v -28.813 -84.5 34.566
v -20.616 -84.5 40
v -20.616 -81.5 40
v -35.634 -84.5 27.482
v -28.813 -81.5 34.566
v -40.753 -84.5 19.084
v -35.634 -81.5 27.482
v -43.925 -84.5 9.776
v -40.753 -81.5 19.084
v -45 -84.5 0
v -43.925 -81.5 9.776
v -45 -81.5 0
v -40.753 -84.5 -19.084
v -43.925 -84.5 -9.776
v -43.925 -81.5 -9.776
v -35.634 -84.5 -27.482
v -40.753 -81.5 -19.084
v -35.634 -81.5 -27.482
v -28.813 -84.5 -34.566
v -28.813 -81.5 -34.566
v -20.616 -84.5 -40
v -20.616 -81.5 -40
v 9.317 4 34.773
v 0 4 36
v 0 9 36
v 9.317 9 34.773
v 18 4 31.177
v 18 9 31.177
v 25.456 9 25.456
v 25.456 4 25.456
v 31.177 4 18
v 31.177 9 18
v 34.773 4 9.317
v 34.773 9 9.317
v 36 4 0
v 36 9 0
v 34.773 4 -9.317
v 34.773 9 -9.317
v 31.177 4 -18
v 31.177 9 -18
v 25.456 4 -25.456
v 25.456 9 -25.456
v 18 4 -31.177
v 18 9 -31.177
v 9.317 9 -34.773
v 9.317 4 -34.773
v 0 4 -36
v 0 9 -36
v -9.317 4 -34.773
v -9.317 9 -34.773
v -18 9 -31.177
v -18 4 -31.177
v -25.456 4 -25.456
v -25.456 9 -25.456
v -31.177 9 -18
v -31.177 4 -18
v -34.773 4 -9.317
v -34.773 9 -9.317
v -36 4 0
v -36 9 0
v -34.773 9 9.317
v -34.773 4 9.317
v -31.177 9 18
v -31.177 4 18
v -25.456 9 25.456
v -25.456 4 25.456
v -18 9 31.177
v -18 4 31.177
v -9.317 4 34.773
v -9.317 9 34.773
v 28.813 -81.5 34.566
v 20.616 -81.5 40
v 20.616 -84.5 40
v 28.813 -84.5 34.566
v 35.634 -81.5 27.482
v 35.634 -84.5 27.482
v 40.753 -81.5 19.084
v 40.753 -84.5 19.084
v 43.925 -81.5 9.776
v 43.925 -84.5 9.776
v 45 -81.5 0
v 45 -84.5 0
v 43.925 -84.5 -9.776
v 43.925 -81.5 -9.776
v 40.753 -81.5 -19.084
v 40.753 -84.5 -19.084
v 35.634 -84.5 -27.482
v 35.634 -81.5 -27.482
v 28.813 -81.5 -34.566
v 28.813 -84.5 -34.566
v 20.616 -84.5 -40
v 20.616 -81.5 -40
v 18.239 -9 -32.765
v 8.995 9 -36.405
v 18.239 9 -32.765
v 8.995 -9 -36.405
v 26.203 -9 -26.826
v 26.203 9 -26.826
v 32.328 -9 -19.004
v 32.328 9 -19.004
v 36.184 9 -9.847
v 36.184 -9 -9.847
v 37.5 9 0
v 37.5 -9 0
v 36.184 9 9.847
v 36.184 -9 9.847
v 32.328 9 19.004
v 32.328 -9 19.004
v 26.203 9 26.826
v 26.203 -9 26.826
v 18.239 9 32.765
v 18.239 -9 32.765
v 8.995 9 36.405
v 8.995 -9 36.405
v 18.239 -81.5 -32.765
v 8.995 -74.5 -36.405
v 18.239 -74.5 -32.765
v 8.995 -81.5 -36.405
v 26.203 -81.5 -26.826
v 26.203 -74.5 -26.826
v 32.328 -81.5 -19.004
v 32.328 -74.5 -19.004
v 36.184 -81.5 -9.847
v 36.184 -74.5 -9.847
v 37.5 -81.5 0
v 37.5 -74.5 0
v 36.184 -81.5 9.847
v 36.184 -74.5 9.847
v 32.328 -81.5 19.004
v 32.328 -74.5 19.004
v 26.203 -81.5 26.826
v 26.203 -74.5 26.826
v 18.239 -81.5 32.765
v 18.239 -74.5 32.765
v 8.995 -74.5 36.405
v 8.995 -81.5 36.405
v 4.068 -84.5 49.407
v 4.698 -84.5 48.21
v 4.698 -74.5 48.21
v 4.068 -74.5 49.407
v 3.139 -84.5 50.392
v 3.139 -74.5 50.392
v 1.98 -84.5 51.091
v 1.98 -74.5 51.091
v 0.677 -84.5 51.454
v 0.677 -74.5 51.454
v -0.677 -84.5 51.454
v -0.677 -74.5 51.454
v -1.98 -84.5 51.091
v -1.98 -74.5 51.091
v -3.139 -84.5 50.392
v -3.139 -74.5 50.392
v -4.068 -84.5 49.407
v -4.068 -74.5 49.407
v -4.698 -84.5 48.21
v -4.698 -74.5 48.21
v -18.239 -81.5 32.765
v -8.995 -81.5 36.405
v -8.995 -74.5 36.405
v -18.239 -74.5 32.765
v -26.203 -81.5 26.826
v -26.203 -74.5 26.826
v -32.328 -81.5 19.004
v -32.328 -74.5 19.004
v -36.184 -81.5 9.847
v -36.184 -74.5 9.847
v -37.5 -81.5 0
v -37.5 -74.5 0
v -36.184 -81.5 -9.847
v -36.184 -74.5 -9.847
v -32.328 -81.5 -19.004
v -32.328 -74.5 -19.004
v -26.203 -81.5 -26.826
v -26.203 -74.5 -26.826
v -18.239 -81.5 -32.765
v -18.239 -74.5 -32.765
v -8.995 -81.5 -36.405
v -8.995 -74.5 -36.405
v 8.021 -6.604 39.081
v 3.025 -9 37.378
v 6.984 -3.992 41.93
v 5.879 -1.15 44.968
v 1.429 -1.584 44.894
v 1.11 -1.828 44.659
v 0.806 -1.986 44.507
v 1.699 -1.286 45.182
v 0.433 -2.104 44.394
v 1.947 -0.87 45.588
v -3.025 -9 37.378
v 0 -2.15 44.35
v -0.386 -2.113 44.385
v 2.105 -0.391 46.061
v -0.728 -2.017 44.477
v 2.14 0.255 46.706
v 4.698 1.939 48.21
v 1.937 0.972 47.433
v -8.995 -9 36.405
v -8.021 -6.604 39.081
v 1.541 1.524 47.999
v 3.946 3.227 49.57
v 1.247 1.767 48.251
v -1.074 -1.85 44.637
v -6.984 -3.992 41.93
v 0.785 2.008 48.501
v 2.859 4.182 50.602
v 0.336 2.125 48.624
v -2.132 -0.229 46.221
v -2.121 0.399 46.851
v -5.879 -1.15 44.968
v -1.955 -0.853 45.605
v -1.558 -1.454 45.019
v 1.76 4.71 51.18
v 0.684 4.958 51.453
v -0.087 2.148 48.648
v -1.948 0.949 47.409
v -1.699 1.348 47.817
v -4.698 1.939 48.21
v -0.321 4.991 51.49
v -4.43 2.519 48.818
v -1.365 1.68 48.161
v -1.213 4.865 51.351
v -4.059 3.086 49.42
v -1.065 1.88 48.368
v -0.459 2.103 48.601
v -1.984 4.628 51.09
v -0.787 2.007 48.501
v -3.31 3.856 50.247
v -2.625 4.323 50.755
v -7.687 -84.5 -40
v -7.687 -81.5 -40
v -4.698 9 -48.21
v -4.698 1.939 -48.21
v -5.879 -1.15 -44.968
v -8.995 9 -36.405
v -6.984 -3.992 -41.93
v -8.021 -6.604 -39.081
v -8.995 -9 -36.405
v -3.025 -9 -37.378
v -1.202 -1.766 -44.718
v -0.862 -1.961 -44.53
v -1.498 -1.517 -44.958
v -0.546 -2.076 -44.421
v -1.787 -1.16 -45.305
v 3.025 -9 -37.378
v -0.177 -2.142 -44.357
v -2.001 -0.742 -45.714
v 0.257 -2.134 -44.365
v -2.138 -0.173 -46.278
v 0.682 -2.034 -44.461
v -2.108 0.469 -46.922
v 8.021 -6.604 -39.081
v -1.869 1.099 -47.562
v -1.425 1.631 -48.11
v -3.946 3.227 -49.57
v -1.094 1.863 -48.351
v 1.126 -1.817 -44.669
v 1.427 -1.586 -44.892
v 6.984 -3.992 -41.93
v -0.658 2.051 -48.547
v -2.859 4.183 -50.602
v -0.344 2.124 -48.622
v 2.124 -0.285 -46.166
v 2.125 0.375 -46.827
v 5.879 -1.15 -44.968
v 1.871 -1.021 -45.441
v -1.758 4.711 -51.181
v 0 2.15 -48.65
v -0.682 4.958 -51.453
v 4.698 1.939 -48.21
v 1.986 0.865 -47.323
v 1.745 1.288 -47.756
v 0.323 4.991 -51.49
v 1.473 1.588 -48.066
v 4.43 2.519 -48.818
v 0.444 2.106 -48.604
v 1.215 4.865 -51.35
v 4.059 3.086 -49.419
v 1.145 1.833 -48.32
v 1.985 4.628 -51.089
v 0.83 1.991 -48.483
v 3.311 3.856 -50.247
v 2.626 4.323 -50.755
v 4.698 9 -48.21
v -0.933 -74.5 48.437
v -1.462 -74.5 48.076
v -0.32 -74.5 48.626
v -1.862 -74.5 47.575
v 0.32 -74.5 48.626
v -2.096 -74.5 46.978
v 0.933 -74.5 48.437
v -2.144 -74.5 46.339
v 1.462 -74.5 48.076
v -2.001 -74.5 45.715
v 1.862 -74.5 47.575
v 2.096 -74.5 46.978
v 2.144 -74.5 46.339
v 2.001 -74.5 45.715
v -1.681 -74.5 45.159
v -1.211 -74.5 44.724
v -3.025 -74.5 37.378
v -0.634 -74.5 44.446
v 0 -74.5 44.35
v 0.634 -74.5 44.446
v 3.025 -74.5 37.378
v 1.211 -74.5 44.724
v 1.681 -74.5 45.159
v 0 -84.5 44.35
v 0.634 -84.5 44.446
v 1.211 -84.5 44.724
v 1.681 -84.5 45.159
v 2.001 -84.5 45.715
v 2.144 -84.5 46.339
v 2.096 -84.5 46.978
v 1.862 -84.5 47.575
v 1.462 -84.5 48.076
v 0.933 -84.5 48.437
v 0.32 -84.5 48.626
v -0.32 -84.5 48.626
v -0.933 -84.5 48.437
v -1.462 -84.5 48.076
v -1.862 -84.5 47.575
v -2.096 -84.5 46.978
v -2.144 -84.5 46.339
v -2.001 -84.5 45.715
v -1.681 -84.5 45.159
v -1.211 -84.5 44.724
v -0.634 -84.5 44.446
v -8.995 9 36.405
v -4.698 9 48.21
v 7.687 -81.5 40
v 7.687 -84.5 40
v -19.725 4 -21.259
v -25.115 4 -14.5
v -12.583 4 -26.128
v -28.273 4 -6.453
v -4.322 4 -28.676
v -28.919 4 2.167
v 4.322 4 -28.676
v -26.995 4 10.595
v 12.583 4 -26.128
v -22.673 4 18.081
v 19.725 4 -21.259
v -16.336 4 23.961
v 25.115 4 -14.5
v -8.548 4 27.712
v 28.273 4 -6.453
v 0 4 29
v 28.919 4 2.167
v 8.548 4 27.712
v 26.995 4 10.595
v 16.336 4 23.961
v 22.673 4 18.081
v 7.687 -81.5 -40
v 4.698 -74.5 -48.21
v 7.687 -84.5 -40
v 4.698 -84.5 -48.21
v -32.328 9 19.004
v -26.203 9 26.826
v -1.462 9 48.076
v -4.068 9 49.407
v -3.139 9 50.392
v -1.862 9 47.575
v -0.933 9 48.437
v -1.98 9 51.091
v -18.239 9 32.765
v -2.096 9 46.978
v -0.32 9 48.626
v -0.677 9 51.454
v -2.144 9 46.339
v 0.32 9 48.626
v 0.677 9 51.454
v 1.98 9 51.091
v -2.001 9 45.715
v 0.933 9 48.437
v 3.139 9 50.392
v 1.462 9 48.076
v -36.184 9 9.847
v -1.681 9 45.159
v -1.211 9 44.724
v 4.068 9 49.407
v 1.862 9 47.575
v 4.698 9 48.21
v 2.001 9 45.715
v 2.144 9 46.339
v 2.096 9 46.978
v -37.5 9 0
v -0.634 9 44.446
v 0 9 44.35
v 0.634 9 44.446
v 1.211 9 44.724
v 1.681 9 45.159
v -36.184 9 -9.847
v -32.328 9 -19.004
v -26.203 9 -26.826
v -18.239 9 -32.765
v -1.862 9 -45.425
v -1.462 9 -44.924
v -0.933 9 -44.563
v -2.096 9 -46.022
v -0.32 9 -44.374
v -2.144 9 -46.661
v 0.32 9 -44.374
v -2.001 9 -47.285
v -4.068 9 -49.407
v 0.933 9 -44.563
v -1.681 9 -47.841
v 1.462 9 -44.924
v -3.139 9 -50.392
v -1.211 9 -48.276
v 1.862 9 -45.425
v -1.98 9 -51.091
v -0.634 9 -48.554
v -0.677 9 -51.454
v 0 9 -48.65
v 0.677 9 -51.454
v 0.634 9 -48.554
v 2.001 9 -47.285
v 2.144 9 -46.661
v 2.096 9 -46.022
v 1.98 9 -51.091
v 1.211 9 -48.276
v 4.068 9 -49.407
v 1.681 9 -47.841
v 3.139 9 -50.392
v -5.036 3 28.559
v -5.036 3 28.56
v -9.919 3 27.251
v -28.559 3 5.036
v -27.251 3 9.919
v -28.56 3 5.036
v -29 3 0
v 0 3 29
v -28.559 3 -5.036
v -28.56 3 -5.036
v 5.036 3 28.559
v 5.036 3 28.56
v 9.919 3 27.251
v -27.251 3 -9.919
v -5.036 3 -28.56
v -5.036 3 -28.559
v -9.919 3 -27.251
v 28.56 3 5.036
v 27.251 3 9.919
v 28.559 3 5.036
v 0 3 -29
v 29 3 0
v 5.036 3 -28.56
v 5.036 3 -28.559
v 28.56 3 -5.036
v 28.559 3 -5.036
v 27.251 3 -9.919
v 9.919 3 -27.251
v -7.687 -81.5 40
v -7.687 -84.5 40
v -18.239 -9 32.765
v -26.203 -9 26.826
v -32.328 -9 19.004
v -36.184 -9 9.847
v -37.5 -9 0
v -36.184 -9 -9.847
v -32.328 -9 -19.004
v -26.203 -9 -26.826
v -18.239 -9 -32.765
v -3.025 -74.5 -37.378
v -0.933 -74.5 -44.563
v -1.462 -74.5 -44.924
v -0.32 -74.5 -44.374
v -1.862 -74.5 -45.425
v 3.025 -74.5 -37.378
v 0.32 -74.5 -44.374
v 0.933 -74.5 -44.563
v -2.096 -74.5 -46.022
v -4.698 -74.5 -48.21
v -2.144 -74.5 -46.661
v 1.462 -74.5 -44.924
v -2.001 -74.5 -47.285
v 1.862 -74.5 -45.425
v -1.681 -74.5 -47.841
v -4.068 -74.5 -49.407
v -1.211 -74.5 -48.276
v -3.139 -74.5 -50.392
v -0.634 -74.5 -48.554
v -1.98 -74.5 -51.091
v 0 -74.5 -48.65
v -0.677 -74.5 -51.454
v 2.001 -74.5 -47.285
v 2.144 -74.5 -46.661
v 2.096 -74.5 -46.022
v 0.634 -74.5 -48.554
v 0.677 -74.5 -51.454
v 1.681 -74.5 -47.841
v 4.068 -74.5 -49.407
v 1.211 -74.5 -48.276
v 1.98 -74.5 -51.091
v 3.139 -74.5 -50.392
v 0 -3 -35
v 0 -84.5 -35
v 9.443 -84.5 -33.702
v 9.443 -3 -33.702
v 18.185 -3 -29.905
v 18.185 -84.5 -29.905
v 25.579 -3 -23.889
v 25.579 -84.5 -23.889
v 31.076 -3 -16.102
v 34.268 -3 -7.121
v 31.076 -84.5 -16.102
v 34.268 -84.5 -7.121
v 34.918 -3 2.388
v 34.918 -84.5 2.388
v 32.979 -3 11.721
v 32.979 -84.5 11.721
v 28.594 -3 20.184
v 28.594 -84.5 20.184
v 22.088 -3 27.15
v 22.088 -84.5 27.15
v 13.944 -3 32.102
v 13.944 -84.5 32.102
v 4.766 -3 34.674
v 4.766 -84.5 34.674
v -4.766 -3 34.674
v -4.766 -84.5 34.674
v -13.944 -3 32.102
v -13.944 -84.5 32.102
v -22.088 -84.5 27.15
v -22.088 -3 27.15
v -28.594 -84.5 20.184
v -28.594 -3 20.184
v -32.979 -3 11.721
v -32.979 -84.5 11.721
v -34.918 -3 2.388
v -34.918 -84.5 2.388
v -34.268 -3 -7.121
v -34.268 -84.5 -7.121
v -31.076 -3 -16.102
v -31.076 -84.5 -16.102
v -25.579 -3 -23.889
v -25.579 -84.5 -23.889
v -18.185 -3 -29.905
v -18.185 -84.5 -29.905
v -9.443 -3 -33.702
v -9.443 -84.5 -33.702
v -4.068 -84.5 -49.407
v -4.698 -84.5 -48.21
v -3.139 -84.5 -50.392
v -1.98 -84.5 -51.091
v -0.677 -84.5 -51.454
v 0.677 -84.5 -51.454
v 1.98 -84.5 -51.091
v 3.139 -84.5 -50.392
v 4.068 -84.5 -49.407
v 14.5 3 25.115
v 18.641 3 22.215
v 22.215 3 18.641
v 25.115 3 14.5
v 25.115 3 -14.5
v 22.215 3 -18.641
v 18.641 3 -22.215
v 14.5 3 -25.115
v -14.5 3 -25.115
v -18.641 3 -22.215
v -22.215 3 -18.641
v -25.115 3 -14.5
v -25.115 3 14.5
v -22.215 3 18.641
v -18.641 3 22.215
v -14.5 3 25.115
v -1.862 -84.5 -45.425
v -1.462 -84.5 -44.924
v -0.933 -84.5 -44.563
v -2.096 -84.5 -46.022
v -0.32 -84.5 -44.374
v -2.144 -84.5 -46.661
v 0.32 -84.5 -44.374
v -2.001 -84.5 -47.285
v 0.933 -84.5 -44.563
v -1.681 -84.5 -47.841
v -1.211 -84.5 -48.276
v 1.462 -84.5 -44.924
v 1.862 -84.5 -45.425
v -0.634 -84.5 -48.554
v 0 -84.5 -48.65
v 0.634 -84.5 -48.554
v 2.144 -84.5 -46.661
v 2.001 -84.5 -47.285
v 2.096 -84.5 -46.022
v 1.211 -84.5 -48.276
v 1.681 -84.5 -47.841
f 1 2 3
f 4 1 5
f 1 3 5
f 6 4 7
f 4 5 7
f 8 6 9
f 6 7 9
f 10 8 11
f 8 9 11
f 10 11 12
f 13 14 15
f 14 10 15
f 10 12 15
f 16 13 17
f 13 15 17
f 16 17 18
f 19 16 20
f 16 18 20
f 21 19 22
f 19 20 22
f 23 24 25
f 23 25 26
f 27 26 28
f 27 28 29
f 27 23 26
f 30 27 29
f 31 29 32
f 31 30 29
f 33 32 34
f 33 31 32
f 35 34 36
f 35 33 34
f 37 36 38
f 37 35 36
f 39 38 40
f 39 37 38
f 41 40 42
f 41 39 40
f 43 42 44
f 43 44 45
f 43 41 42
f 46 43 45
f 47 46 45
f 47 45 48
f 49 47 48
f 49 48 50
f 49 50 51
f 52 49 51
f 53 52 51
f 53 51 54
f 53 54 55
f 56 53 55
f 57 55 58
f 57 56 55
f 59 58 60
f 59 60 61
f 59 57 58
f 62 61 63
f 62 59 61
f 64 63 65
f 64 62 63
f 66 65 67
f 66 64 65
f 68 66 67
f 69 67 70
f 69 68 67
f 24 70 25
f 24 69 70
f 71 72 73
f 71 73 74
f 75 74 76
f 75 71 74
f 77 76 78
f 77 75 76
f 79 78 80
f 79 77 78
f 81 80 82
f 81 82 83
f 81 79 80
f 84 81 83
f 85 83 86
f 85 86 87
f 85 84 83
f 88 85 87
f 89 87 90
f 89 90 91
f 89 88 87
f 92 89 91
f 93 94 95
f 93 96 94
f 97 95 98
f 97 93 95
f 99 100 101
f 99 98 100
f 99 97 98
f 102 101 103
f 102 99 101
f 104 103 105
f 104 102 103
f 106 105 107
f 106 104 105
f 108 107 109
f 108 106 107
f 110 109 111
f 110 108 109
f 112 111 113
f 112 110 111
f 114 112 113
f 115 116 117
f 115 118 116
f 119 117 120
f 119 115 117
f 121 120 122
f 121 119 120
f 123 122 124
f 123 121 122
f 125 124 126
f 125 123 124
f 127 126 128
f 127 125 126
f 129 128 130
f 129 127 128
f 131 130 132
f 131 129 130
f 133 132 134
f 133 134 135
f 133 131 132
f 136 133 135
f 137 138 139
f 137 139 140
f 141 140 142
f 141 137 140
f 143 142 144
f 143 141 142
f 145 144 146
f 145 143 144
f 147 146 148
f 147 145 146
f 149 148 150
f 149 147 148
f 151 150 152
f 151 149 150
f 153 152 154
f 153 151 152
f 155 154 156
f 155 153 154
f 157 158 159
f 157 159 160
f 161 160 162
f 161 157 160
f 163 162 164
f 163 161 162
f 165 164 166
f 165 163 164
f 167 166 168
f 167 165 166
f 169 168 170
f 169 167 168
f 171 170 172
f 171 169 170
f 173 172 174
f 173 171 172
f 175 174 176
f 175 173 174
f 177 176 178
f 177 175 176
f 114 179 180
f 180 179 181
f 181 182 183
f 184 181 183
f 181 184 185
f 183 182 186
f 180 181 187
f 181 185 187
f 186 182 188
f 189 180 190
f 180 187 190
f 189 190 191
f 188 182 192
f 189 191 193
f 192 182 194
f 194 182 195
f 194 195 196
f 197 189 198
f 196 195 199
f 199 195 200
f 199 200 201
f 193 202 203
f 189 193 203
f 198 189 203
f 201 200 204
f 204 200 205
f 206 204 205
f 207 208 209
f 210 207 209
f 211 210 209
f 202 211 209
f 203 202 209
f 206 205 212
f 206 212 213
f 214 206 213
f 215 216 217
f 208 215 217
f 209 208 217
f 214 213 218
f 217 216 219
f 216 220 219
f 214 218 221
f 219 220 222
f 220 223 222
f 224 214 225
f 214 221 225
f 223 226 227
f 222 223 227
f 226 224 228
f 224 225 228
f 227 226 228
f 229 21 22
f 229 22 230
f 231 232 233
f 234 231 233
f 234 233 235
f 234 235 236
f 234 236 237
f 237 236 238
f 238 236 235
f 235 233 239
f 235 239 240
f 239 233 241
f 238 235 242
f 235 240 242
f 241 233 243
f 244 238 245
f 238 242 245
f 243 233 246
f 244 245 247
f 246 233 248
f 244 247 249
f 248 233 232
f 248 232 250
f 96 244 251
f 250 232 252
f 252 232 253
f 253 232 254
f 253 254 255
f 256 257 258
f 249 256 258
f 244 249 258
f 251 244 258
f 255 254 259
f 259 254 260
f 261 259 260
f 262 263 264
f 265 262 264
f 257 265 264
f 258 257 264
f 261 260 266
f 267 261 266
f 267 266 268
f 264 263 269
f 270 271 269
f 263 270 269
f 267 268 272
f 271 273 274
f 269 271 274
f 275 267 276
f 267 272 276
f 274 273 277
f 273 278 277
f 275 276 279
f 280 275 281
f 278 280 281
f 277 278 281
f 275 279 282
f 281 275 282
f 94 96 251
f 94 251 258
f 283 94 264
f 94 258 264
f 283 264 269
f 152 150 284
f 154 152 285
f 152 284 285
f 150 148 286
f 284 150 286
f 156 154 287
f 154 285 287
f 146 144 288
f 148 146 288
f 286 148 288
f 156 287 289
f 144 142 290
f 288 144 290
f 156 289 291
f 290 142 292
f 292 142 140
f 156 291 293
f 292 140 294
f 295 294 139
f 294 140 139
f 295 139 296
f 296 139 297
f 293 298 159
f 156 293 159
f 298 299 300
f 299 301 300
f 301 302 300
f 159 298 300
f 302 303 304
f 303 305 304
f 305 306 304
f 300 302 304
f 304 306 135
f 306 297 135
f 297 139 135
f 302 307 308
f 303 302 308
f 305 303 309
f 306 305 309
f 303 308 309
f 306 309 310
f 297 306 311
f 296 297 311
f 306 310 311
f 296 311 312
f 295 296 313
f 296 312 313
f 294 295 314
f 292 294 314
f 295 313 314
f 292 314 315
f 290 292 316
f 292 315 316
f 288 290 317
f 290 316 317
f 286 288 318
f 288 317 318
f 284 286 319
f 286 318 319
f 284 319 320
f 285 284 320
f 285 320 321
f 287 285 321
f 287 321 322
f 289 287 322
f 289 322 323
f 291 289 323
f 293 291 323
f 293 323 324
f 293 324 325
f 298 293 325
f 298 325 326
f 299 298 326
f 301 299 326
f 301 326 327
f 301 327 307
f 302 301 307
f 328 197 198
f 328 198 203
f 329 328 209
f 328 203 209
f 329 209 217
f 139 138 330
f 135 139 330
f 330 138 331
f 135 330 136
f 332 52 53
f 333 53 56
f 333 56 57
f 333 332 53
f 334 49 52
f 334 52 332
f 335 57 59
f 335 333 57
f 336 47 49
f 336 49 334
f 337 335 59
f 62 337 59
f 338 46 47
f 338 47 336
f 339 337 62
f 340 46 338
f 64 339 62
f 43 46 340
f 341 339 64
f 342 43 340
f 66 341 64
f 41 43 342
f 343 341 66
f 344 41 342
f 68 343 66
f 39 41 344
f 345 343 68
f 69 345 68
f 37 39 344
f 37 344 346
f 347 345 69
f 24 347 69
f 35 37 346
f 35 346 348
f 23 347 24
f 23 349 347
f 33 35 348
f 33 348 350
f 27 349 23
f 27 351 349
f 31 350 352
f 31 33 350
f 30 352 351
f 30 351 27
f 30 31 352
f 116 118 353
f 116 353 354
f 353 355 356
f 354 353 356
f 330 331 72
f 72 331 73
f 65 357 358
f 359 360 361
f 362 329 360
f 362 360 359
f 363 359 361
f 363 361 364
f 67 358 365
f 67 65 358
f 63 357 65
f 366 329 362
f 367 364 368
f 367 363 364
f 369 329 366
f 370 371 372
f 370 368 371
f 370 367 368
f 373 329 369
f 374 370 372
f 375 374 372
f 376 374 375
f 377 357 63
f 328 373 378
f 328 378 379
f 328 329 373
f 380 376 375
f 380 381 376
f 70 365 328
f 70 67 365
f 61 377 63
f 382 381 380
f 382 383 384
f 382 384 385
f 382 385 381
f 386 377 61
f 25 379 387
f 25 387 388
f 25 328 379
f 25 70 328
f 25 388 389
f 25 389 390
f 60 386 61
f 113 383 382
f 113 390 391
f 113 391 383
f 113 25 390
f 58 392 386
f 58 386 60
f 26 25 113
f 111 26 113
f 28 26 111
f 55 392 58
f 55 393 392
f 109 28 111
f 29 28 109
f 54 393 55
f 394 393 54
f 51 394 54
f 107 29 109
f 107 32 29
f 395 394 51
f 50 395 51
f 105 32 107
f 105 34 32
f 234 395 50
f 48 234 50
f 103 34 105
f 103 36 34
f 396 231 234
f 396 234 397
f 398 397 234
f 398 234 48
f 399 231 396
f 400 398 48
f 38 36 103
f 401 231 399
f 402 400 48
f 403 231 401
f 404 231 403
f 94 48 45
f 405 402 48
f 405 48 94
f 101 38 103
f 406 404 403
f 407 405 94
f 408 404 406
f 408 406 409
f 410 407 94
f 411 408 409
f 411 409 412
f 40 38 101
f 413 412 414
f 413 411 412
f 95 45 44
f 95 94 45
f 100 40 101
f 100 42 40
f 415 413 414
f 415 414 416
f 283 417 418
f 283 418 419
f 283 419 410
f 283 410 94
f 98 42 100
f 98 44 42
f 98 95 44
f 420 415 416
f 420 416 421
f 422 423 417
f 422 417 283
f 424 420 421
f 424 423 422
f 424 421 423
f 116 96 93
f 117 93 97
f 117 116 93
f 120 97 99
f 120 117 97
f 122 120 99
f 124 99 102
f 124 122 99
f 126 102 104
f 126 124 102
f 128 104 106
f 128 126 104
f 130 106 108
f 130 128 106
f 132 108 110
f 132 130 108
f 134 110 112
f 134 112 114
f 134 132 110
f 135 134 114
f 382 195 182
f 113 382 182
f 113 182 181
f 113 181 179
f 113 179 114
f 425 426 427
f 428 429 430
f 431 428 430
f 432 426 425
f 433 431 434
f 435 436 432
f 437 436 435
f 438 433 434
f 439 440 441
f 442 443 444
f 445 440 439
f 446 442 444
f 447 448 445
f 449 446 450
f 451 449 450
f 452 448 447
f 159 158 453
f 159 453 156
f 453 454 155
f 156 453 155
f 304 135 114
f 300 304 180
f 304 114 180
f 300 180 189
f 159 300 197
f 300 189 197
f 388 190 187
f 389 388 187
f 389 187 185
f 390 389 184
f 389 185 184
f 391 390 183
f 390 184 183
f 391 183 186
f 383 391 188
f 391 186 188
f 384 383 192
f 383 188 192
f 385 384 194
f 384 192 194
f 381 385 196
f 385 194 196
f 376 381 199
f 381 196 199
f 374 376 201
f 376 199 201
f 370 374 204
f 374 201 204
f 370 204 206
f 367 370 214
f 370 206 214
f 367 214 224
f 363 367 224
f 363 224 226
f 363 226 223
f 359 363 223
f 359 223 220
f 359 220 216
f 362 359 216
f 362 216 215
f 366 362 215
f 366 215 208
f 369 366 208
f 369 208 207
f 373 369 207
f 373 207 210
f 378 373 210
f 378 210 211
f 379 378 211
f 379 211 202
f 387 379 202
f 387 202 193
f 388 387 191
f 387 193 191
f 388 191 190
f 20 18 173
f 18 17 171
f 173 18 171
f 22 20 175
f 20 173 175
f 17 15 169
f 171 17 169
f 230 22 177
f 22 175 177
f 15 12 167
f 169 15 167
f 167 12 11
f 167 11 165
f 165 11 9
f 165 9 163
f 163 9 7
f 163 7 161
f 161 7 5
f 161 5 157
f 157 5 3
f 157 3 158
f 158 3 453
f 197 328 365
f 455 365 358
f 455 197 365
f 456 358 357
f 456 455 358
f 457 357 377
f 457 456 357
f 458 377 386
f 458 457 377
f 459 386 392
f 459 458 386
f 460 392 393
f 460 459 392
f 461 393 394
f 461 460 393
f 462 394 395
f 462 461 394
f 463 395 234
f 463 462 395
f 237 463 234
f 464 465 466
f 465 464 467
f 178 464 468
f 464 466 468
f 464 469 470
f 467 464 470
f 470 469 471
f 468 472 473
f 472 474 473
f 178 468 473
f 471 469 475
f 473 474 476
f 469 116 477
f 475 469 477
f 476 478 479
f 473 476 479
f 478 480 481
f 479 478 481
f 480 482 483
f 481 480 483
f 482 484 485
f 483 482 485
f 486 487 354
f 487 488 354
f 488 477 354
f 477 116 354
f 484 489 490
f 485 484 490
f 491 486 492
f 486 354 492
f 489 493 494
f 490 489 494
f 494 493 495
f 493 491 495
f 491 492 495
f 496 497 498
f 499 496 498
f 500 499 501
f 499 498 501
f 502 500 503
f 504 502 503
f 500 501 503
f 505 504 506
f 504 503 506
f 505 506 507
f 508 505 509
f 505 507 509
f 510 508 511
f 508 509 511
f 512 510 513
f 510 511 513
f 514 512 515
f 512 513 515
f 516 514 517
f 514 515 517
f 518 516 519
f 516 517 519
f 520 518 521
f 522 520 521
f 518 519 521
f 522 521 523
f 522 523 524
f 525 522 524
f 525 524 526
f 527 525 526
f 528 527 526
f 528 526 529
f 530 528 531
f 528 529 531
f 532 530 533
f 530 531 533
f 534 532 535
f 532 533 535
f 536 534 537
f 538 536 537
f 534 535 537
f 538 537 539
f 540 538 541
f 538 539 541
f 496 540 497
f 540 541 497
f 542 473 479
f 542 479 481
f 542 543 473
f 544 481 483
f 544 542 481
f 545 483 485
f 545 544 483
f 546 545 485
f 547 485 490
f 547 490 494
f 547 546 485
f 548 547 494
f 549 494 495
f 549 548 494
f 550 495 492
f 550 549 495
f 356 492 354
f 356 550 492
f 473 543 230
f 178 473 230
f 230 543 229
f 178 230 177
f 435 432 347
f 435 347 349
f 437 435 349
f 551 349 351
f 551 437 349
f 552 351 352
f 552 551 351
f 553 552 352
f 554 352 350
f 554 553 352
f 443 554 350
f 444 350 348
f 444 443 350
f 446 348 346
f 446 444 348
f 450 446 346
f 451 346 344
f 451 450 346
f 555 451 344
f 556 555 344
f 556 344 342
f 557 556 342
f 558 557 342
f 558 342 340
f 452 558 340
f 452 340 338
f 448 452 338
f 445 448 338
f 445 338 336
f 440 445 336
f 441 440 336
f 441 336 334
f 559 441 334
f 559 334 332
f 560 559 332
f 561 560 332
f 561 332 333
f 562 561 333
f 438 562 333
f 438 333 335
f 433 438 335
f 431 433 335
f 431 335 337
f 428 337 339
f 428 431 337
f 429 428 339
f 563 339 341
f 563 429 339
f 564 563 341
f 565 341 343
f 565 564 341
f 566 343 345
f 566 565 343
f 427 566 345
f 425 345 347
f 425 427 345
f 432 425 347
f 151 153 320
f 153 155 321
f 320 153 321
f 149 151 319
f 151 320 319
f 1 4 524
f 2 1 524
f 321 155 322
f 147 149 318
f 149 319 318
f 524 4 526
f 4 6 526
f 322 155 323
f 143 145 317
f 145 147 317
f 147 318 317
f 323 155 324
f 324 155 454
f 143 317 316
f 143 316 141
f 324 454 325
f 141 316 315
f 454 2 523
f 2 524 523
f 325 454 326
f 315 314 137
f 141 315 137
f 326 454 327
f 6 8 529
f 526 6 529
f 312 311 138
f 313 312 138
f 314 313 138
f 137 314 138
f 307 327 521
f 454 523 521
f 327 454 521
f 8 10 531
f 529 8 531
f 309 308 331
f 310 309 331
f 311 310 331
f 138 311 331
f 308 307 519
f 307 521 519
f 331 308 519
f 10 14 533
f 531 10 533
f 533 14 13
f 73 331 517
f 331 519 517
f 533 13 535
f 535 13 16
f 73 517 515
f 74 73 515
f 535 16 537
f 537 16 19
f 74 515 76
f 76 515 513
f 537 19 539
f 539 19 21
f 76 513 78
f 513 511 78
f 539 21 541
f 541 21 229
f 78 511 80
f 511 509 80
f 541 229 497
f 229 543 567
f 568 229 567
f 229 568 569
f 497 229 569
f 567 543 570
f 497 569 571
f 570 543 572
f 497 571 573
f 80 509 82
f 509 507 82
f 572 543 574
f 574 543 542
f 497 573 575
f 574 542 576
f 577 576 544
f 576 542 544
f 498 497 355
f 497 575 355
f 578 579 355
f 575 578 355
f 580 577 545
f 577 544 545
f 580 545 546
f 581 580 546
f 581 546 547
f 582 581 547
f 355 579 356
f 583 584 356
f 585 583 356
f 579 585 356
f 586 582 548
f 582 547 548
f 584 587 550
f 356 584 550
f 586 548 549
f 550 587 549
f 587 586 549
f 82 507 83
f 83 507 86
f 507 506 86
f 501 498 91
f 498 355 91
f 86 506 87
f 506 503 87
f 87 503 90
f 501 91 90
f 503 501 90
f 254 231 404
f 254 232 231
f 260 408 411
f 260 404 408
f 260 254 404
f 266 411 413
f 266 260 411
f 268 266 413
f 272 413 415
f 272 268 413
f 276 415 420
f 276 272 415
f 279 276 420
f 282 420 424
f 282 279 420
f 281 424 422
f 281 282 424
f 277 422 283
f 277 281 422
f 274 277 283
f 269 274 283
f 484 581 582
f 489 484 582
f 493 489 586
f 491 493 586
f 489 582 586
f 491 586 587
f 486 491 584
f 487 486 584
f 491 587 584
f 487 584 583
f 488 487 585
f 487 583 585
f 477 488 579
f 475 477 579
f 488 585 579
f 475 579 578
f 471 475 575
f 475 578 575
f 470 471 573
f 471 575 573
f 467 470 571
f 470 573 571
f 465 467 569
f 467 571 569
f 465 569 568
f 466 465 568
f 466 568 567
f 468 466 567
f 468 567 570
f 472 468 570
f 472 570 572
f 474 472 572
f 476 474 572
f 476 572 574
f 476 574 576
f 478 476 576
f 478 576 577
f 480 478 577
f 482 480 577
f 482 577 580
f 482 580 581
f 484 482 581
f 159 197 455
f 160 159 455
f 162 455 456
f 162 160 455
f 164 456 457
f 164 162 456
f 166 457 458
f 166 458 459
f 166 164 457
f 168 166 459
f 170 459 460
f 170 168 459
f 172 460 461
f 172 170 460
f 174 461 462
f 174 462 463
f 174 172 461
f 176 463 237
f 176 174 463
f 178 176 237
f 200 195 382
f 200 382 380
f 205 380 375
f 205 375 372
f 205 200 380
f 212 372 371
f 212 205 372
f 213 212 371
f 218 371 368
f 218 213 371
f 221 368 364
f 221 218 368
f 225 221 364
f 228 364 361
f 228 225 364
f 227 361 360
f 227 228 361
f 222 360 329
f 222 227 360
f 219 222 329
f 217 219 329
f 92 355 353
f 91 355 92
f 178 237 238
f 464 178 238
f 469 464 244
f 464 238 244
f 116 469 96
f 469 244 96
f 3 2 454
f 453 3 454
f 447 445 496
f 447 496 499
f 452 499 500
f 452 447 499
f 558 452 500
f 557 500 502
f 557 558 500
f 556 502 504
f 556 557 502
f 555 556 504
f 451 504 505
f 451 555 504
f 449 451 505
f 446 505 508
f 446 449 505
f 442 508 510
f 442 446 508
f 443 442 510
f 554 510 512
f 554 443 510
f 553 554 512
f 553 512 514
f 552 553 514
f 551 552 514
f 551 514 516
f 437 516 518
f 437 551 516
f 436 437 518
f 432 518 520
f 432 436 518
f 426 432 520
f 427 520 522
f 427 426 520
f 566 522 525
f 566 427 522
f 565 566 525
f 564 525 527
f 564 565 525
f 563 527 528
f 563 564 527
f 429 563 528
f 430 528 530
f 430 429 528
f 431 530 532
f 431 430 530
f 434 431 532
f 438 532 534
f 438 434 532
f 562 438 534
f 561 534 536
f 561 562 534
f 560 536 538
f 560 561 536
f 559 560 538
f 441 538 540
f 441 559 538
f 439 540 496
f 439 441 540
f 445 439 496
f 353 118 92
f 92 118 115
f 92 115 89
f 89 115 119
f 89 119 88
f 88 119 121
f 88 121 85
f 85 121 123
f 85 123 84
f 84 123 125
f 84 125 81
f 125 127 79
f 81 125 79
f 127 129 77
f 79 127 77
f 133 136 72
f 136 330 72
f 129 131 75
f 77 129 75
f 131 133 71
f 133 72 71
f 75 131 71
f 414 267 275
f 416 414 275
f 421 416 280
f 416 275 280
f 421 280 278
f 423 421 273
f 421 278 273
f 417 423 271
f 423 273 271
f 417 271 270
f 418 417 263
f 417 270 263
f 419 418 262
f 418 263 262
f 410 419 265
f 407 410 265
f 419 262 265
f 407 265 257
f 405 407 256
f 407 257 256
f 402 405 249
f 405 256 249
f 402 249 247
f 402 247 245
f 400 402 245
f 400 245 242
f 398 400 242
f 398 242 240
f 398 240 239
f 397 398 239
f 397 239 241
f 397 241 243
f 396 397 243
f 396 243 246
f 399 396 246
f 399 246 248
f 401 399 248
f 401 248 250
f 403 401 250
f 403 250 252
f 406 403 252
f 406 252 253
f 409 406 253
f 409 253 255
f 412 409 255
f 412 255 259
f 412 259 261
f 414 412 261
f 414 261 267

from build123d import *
from build123d.topology import SkipClean

# Parameters (mm, degrees)
SKETCH_1_R          = 37.5
SKETCH_1_R_2        = 29
EXTRUDE_1_DEPTH     = 4
SKETCH_2_R          = 37.5
SKETCH_2_R_2        = 36
EXTRUDE_2_DEPTH     = 5
EXTRUDE_START       = 84.5
SKETCH_3_R          = 37.5
SKETCH_3_R_2        = 29
EXTRUDE_3_DEPTH     = 84.5
SKETCH_4_W          = 100
SKETCH_4_H          = 80
SKETCH_4_R          = 37.5
EXTRUDE_4_DEPTH     = 3
SKETCH_5_R          = 5
SKETCH_5_R_2        = 2.15
EXTRUDE_5_DEPTH     = 93.5
EXTRUDE_5_2_DEPTH   = 93.5
EXTRUDE_START_2     = -3
EXTRUDE_6_DEPTH     = 93.5
SKETCH_8_R          = 35
CUT_EXTRUDE_1_DEPTH = 87.5
CHAMFER_1_SIZE      = 6
CUT_EXTRUDE_2_DEPTH = 116.509739972


with BuildPart() as part:
    # 草图1 → 凸台-拉伸1 (new body)
    with BuildSketch(Plane(origin=(0, 0, 0), x_dir=(1, 0, 0), z_dir=(0, 1, 0))):
        with Locations(Location((0, 0, 0), (0, 0, 270))):
            Circle(SKETCH_1_R)
        with Locations(Location((0, 0, 0), (0, 0, 270))):
            Circle(SKETCH_1_R_2, mode=Mode.SUBTRACT)
    extrude(amount=EXTRUDE_1_DEPTH)

    # 草图2 → 凸台-拉伸2 (add)
    with BuildSketch(Plane(origin=(0, 4, 0), x_dir=(1, 0, 0), z_dir=(0, 1, 0))):
        with Locations(Location((0, 0, 0), (0, 0, 270))):
            Circle(SKETCH_2_R)
        with Locations(Location((0, 0, 0), (0, 0, 270))):
            Circle(SKETCH_2_R_2, mode=Mode.SUBTRACT)
    extrude(amount=EXTRUDE_2_DEPTH)

    # 草图3 → 凸台-拉伸3 (add)
    with BuildSketch(Plane.XZ.offset(EXTRUDE_START)):
        with Locations(Location((0, 0, 0), (0, 0, 270))):
            Circle(SKETCH_3_R)
        with Locations(Location((0, 0, 0), (0, 0, 270))):
            Circle(SKETCH_3_R_2, mode=Mode.SUBTRACT)
    extrude(amount=-EXTRUDE_3_DEPTH)

    # 草图4 → 凸台-拉伸4 (add)
    with BuildSketch(Plane.XZ.offset(84.5)):
        Rectangle(SKETCH_4_W, SKETCH_4_H)
        with Locations(Location((0, 0, 0), (0, 0, 270))):
            Circle(SKETCH_4_R, mode=Mode.SUBTRACT)
    extrude(amount=-EXTRUDE_4_DEPTH)

    # 草图6 → 凸台-拉伸6 (add)
    with SkipClean():  # the faces are left unmerged after this step: merging them gives an invalid solid
        with BuildSketch(Plane(origin=(0, -81.5, 0), x_dir=(1, 0, 0), z_dir=(0, 1, 0)).offset(EXTRUDE_START_2)):
            with BuildLine():
                Line((-4.698463104, 48.210100717), (-8.995097405, 36.405194996))
                ThreePointArc((-8.995097405, 36.405194996), (0, 37.5), (8.995097405, 36.405194996))
                Line((8.995097405, 36.405194996), (4.698463104, 48.210100717))
                ThreePointArc((4.698463104, 48.210100717), (0, 41.5), (-4.698463104, 48.210100717))
            make_face()
            with BuildLine():
                Line((4.698463104, -48.210100717), (8.995097405, -36.405194996))
                ThreePointArc((8.995097405, -36.405194996), (0, -37.5), (-8.995097405, -36.405194996))
                Line((-8.995097405, -36.405194996), (-4.698463104, -48.210100717))
                ThreePointArc((-4.698463104, -48.210100717), (0, -41.5), (4.698463104, -48.210100717))
            make_face()
        extrude(amount=EXTRUDE_6_DEPTH)


with BuildPart() as body_2:
    # 草图5 → 凸台-拉伸5 (new body)
    with BuildSketch(Plane.XZ.offset(84.5)):
        with Locations(Location((0, 46.5, 0), (0, 0, 270))):
            Circle(SKETCH_5_R)
        with Locations(Location((0, 46.5, 0), (0, 0, 270))):
            Circle(SKETCH_5_R_2, mode=Mode.SUBTRACT)
    extrude(amount=-EXTRUDE_5_DEPTH)


with BuildPart() as body_3:
    # 草图5 → Extrude 5 2 (new body)
    with BuildSketch(Plane.XZ.offset(84.5)):
        with Locations(Location((0, -46.5, 0), (0, 0, 270))):
            Circle(SKETCH_5_R)
        with Locations(Location((0, -46.5, 0), (0, 0, 270))):
            Circle(SKETCH_5_R_2, mode=Mode.SUBTRACT)
    extrude(amount=-EXTRUDE_5_2_DEPTH)

    # Combine 2: union body 2, part
    add(body_2.part)
    add(part.part)

    # 草图8 → 切除-拉伸1 (cut)
    with BuildSketch(Plane.XZ.offset(84.5)):
        with Locations(Location((0, 0, 0), (0, 0, 270))):
            Circle(SKETCH_8_R)
    extrude(amount=-CUT_EXTRUDE_1_DEPTH, mode=Mode.SUBTRACT)

    # 倒角1
    chamfer_1_edges = [body_3.edges().sort_by_distance(p)[0] for p in [
        (0, 3, 35),
    ]]
    chamfer(chamfer_1_edges, length=CHAMFER_1_SIZE - 0.0001)  # a hair under: the kernel refuses the full size

    # 草图9 → 切除-旋转1 (revolve, cut)
    with BuildSketch(Plane.XY, mode=Mode.PRIVATE) as cut_revolve_1_sk:
        Polygon((-37.5, -9), (-60, 13.5), (-60, -74.5), (-37.5, -74.5), align=None)
    revolve(cut_revolve_1_sk.sketch.rotate(Axis((0, 9, 0), (0, -1, 0)), 76.121175643), axis=Axis((0, 9, 0), (0, -1, 0)), mode=Mode.SUBTRACT)

    # 草图11 → 切除-拉伸2 (cut, through all)
    with BuildSketch(Plane(origin=(0, -81.5, 0), x_dir=(1, 0, 0), z_dir=(0, 1, 0))):
        with BuildLine():
            Line((-20.615528128, 40), (-50, 40))
            Line((-50, 40), (-50, -40))
            Line((-50, -40), (-20.615528128, -40))
            ThreePointArc((-20.615528128, -40), (-45, 0), (-20.615528128, 40))
        make_face()
        with BuildLine():
            Line((20.615528128, 40), (50, 40))
            Line((50, 40), (50, -40))
            Line((50, -40), (20.615528128, -40))
            ThreePointArc((20.615528128, -40), (45, 0), (20.615528128, 40))
        make_face()
    extrude(amount=-CUT_EXTRUDE_2_DEPTH, mode=Mode.SUBTRACT)


solid = body_3.part
